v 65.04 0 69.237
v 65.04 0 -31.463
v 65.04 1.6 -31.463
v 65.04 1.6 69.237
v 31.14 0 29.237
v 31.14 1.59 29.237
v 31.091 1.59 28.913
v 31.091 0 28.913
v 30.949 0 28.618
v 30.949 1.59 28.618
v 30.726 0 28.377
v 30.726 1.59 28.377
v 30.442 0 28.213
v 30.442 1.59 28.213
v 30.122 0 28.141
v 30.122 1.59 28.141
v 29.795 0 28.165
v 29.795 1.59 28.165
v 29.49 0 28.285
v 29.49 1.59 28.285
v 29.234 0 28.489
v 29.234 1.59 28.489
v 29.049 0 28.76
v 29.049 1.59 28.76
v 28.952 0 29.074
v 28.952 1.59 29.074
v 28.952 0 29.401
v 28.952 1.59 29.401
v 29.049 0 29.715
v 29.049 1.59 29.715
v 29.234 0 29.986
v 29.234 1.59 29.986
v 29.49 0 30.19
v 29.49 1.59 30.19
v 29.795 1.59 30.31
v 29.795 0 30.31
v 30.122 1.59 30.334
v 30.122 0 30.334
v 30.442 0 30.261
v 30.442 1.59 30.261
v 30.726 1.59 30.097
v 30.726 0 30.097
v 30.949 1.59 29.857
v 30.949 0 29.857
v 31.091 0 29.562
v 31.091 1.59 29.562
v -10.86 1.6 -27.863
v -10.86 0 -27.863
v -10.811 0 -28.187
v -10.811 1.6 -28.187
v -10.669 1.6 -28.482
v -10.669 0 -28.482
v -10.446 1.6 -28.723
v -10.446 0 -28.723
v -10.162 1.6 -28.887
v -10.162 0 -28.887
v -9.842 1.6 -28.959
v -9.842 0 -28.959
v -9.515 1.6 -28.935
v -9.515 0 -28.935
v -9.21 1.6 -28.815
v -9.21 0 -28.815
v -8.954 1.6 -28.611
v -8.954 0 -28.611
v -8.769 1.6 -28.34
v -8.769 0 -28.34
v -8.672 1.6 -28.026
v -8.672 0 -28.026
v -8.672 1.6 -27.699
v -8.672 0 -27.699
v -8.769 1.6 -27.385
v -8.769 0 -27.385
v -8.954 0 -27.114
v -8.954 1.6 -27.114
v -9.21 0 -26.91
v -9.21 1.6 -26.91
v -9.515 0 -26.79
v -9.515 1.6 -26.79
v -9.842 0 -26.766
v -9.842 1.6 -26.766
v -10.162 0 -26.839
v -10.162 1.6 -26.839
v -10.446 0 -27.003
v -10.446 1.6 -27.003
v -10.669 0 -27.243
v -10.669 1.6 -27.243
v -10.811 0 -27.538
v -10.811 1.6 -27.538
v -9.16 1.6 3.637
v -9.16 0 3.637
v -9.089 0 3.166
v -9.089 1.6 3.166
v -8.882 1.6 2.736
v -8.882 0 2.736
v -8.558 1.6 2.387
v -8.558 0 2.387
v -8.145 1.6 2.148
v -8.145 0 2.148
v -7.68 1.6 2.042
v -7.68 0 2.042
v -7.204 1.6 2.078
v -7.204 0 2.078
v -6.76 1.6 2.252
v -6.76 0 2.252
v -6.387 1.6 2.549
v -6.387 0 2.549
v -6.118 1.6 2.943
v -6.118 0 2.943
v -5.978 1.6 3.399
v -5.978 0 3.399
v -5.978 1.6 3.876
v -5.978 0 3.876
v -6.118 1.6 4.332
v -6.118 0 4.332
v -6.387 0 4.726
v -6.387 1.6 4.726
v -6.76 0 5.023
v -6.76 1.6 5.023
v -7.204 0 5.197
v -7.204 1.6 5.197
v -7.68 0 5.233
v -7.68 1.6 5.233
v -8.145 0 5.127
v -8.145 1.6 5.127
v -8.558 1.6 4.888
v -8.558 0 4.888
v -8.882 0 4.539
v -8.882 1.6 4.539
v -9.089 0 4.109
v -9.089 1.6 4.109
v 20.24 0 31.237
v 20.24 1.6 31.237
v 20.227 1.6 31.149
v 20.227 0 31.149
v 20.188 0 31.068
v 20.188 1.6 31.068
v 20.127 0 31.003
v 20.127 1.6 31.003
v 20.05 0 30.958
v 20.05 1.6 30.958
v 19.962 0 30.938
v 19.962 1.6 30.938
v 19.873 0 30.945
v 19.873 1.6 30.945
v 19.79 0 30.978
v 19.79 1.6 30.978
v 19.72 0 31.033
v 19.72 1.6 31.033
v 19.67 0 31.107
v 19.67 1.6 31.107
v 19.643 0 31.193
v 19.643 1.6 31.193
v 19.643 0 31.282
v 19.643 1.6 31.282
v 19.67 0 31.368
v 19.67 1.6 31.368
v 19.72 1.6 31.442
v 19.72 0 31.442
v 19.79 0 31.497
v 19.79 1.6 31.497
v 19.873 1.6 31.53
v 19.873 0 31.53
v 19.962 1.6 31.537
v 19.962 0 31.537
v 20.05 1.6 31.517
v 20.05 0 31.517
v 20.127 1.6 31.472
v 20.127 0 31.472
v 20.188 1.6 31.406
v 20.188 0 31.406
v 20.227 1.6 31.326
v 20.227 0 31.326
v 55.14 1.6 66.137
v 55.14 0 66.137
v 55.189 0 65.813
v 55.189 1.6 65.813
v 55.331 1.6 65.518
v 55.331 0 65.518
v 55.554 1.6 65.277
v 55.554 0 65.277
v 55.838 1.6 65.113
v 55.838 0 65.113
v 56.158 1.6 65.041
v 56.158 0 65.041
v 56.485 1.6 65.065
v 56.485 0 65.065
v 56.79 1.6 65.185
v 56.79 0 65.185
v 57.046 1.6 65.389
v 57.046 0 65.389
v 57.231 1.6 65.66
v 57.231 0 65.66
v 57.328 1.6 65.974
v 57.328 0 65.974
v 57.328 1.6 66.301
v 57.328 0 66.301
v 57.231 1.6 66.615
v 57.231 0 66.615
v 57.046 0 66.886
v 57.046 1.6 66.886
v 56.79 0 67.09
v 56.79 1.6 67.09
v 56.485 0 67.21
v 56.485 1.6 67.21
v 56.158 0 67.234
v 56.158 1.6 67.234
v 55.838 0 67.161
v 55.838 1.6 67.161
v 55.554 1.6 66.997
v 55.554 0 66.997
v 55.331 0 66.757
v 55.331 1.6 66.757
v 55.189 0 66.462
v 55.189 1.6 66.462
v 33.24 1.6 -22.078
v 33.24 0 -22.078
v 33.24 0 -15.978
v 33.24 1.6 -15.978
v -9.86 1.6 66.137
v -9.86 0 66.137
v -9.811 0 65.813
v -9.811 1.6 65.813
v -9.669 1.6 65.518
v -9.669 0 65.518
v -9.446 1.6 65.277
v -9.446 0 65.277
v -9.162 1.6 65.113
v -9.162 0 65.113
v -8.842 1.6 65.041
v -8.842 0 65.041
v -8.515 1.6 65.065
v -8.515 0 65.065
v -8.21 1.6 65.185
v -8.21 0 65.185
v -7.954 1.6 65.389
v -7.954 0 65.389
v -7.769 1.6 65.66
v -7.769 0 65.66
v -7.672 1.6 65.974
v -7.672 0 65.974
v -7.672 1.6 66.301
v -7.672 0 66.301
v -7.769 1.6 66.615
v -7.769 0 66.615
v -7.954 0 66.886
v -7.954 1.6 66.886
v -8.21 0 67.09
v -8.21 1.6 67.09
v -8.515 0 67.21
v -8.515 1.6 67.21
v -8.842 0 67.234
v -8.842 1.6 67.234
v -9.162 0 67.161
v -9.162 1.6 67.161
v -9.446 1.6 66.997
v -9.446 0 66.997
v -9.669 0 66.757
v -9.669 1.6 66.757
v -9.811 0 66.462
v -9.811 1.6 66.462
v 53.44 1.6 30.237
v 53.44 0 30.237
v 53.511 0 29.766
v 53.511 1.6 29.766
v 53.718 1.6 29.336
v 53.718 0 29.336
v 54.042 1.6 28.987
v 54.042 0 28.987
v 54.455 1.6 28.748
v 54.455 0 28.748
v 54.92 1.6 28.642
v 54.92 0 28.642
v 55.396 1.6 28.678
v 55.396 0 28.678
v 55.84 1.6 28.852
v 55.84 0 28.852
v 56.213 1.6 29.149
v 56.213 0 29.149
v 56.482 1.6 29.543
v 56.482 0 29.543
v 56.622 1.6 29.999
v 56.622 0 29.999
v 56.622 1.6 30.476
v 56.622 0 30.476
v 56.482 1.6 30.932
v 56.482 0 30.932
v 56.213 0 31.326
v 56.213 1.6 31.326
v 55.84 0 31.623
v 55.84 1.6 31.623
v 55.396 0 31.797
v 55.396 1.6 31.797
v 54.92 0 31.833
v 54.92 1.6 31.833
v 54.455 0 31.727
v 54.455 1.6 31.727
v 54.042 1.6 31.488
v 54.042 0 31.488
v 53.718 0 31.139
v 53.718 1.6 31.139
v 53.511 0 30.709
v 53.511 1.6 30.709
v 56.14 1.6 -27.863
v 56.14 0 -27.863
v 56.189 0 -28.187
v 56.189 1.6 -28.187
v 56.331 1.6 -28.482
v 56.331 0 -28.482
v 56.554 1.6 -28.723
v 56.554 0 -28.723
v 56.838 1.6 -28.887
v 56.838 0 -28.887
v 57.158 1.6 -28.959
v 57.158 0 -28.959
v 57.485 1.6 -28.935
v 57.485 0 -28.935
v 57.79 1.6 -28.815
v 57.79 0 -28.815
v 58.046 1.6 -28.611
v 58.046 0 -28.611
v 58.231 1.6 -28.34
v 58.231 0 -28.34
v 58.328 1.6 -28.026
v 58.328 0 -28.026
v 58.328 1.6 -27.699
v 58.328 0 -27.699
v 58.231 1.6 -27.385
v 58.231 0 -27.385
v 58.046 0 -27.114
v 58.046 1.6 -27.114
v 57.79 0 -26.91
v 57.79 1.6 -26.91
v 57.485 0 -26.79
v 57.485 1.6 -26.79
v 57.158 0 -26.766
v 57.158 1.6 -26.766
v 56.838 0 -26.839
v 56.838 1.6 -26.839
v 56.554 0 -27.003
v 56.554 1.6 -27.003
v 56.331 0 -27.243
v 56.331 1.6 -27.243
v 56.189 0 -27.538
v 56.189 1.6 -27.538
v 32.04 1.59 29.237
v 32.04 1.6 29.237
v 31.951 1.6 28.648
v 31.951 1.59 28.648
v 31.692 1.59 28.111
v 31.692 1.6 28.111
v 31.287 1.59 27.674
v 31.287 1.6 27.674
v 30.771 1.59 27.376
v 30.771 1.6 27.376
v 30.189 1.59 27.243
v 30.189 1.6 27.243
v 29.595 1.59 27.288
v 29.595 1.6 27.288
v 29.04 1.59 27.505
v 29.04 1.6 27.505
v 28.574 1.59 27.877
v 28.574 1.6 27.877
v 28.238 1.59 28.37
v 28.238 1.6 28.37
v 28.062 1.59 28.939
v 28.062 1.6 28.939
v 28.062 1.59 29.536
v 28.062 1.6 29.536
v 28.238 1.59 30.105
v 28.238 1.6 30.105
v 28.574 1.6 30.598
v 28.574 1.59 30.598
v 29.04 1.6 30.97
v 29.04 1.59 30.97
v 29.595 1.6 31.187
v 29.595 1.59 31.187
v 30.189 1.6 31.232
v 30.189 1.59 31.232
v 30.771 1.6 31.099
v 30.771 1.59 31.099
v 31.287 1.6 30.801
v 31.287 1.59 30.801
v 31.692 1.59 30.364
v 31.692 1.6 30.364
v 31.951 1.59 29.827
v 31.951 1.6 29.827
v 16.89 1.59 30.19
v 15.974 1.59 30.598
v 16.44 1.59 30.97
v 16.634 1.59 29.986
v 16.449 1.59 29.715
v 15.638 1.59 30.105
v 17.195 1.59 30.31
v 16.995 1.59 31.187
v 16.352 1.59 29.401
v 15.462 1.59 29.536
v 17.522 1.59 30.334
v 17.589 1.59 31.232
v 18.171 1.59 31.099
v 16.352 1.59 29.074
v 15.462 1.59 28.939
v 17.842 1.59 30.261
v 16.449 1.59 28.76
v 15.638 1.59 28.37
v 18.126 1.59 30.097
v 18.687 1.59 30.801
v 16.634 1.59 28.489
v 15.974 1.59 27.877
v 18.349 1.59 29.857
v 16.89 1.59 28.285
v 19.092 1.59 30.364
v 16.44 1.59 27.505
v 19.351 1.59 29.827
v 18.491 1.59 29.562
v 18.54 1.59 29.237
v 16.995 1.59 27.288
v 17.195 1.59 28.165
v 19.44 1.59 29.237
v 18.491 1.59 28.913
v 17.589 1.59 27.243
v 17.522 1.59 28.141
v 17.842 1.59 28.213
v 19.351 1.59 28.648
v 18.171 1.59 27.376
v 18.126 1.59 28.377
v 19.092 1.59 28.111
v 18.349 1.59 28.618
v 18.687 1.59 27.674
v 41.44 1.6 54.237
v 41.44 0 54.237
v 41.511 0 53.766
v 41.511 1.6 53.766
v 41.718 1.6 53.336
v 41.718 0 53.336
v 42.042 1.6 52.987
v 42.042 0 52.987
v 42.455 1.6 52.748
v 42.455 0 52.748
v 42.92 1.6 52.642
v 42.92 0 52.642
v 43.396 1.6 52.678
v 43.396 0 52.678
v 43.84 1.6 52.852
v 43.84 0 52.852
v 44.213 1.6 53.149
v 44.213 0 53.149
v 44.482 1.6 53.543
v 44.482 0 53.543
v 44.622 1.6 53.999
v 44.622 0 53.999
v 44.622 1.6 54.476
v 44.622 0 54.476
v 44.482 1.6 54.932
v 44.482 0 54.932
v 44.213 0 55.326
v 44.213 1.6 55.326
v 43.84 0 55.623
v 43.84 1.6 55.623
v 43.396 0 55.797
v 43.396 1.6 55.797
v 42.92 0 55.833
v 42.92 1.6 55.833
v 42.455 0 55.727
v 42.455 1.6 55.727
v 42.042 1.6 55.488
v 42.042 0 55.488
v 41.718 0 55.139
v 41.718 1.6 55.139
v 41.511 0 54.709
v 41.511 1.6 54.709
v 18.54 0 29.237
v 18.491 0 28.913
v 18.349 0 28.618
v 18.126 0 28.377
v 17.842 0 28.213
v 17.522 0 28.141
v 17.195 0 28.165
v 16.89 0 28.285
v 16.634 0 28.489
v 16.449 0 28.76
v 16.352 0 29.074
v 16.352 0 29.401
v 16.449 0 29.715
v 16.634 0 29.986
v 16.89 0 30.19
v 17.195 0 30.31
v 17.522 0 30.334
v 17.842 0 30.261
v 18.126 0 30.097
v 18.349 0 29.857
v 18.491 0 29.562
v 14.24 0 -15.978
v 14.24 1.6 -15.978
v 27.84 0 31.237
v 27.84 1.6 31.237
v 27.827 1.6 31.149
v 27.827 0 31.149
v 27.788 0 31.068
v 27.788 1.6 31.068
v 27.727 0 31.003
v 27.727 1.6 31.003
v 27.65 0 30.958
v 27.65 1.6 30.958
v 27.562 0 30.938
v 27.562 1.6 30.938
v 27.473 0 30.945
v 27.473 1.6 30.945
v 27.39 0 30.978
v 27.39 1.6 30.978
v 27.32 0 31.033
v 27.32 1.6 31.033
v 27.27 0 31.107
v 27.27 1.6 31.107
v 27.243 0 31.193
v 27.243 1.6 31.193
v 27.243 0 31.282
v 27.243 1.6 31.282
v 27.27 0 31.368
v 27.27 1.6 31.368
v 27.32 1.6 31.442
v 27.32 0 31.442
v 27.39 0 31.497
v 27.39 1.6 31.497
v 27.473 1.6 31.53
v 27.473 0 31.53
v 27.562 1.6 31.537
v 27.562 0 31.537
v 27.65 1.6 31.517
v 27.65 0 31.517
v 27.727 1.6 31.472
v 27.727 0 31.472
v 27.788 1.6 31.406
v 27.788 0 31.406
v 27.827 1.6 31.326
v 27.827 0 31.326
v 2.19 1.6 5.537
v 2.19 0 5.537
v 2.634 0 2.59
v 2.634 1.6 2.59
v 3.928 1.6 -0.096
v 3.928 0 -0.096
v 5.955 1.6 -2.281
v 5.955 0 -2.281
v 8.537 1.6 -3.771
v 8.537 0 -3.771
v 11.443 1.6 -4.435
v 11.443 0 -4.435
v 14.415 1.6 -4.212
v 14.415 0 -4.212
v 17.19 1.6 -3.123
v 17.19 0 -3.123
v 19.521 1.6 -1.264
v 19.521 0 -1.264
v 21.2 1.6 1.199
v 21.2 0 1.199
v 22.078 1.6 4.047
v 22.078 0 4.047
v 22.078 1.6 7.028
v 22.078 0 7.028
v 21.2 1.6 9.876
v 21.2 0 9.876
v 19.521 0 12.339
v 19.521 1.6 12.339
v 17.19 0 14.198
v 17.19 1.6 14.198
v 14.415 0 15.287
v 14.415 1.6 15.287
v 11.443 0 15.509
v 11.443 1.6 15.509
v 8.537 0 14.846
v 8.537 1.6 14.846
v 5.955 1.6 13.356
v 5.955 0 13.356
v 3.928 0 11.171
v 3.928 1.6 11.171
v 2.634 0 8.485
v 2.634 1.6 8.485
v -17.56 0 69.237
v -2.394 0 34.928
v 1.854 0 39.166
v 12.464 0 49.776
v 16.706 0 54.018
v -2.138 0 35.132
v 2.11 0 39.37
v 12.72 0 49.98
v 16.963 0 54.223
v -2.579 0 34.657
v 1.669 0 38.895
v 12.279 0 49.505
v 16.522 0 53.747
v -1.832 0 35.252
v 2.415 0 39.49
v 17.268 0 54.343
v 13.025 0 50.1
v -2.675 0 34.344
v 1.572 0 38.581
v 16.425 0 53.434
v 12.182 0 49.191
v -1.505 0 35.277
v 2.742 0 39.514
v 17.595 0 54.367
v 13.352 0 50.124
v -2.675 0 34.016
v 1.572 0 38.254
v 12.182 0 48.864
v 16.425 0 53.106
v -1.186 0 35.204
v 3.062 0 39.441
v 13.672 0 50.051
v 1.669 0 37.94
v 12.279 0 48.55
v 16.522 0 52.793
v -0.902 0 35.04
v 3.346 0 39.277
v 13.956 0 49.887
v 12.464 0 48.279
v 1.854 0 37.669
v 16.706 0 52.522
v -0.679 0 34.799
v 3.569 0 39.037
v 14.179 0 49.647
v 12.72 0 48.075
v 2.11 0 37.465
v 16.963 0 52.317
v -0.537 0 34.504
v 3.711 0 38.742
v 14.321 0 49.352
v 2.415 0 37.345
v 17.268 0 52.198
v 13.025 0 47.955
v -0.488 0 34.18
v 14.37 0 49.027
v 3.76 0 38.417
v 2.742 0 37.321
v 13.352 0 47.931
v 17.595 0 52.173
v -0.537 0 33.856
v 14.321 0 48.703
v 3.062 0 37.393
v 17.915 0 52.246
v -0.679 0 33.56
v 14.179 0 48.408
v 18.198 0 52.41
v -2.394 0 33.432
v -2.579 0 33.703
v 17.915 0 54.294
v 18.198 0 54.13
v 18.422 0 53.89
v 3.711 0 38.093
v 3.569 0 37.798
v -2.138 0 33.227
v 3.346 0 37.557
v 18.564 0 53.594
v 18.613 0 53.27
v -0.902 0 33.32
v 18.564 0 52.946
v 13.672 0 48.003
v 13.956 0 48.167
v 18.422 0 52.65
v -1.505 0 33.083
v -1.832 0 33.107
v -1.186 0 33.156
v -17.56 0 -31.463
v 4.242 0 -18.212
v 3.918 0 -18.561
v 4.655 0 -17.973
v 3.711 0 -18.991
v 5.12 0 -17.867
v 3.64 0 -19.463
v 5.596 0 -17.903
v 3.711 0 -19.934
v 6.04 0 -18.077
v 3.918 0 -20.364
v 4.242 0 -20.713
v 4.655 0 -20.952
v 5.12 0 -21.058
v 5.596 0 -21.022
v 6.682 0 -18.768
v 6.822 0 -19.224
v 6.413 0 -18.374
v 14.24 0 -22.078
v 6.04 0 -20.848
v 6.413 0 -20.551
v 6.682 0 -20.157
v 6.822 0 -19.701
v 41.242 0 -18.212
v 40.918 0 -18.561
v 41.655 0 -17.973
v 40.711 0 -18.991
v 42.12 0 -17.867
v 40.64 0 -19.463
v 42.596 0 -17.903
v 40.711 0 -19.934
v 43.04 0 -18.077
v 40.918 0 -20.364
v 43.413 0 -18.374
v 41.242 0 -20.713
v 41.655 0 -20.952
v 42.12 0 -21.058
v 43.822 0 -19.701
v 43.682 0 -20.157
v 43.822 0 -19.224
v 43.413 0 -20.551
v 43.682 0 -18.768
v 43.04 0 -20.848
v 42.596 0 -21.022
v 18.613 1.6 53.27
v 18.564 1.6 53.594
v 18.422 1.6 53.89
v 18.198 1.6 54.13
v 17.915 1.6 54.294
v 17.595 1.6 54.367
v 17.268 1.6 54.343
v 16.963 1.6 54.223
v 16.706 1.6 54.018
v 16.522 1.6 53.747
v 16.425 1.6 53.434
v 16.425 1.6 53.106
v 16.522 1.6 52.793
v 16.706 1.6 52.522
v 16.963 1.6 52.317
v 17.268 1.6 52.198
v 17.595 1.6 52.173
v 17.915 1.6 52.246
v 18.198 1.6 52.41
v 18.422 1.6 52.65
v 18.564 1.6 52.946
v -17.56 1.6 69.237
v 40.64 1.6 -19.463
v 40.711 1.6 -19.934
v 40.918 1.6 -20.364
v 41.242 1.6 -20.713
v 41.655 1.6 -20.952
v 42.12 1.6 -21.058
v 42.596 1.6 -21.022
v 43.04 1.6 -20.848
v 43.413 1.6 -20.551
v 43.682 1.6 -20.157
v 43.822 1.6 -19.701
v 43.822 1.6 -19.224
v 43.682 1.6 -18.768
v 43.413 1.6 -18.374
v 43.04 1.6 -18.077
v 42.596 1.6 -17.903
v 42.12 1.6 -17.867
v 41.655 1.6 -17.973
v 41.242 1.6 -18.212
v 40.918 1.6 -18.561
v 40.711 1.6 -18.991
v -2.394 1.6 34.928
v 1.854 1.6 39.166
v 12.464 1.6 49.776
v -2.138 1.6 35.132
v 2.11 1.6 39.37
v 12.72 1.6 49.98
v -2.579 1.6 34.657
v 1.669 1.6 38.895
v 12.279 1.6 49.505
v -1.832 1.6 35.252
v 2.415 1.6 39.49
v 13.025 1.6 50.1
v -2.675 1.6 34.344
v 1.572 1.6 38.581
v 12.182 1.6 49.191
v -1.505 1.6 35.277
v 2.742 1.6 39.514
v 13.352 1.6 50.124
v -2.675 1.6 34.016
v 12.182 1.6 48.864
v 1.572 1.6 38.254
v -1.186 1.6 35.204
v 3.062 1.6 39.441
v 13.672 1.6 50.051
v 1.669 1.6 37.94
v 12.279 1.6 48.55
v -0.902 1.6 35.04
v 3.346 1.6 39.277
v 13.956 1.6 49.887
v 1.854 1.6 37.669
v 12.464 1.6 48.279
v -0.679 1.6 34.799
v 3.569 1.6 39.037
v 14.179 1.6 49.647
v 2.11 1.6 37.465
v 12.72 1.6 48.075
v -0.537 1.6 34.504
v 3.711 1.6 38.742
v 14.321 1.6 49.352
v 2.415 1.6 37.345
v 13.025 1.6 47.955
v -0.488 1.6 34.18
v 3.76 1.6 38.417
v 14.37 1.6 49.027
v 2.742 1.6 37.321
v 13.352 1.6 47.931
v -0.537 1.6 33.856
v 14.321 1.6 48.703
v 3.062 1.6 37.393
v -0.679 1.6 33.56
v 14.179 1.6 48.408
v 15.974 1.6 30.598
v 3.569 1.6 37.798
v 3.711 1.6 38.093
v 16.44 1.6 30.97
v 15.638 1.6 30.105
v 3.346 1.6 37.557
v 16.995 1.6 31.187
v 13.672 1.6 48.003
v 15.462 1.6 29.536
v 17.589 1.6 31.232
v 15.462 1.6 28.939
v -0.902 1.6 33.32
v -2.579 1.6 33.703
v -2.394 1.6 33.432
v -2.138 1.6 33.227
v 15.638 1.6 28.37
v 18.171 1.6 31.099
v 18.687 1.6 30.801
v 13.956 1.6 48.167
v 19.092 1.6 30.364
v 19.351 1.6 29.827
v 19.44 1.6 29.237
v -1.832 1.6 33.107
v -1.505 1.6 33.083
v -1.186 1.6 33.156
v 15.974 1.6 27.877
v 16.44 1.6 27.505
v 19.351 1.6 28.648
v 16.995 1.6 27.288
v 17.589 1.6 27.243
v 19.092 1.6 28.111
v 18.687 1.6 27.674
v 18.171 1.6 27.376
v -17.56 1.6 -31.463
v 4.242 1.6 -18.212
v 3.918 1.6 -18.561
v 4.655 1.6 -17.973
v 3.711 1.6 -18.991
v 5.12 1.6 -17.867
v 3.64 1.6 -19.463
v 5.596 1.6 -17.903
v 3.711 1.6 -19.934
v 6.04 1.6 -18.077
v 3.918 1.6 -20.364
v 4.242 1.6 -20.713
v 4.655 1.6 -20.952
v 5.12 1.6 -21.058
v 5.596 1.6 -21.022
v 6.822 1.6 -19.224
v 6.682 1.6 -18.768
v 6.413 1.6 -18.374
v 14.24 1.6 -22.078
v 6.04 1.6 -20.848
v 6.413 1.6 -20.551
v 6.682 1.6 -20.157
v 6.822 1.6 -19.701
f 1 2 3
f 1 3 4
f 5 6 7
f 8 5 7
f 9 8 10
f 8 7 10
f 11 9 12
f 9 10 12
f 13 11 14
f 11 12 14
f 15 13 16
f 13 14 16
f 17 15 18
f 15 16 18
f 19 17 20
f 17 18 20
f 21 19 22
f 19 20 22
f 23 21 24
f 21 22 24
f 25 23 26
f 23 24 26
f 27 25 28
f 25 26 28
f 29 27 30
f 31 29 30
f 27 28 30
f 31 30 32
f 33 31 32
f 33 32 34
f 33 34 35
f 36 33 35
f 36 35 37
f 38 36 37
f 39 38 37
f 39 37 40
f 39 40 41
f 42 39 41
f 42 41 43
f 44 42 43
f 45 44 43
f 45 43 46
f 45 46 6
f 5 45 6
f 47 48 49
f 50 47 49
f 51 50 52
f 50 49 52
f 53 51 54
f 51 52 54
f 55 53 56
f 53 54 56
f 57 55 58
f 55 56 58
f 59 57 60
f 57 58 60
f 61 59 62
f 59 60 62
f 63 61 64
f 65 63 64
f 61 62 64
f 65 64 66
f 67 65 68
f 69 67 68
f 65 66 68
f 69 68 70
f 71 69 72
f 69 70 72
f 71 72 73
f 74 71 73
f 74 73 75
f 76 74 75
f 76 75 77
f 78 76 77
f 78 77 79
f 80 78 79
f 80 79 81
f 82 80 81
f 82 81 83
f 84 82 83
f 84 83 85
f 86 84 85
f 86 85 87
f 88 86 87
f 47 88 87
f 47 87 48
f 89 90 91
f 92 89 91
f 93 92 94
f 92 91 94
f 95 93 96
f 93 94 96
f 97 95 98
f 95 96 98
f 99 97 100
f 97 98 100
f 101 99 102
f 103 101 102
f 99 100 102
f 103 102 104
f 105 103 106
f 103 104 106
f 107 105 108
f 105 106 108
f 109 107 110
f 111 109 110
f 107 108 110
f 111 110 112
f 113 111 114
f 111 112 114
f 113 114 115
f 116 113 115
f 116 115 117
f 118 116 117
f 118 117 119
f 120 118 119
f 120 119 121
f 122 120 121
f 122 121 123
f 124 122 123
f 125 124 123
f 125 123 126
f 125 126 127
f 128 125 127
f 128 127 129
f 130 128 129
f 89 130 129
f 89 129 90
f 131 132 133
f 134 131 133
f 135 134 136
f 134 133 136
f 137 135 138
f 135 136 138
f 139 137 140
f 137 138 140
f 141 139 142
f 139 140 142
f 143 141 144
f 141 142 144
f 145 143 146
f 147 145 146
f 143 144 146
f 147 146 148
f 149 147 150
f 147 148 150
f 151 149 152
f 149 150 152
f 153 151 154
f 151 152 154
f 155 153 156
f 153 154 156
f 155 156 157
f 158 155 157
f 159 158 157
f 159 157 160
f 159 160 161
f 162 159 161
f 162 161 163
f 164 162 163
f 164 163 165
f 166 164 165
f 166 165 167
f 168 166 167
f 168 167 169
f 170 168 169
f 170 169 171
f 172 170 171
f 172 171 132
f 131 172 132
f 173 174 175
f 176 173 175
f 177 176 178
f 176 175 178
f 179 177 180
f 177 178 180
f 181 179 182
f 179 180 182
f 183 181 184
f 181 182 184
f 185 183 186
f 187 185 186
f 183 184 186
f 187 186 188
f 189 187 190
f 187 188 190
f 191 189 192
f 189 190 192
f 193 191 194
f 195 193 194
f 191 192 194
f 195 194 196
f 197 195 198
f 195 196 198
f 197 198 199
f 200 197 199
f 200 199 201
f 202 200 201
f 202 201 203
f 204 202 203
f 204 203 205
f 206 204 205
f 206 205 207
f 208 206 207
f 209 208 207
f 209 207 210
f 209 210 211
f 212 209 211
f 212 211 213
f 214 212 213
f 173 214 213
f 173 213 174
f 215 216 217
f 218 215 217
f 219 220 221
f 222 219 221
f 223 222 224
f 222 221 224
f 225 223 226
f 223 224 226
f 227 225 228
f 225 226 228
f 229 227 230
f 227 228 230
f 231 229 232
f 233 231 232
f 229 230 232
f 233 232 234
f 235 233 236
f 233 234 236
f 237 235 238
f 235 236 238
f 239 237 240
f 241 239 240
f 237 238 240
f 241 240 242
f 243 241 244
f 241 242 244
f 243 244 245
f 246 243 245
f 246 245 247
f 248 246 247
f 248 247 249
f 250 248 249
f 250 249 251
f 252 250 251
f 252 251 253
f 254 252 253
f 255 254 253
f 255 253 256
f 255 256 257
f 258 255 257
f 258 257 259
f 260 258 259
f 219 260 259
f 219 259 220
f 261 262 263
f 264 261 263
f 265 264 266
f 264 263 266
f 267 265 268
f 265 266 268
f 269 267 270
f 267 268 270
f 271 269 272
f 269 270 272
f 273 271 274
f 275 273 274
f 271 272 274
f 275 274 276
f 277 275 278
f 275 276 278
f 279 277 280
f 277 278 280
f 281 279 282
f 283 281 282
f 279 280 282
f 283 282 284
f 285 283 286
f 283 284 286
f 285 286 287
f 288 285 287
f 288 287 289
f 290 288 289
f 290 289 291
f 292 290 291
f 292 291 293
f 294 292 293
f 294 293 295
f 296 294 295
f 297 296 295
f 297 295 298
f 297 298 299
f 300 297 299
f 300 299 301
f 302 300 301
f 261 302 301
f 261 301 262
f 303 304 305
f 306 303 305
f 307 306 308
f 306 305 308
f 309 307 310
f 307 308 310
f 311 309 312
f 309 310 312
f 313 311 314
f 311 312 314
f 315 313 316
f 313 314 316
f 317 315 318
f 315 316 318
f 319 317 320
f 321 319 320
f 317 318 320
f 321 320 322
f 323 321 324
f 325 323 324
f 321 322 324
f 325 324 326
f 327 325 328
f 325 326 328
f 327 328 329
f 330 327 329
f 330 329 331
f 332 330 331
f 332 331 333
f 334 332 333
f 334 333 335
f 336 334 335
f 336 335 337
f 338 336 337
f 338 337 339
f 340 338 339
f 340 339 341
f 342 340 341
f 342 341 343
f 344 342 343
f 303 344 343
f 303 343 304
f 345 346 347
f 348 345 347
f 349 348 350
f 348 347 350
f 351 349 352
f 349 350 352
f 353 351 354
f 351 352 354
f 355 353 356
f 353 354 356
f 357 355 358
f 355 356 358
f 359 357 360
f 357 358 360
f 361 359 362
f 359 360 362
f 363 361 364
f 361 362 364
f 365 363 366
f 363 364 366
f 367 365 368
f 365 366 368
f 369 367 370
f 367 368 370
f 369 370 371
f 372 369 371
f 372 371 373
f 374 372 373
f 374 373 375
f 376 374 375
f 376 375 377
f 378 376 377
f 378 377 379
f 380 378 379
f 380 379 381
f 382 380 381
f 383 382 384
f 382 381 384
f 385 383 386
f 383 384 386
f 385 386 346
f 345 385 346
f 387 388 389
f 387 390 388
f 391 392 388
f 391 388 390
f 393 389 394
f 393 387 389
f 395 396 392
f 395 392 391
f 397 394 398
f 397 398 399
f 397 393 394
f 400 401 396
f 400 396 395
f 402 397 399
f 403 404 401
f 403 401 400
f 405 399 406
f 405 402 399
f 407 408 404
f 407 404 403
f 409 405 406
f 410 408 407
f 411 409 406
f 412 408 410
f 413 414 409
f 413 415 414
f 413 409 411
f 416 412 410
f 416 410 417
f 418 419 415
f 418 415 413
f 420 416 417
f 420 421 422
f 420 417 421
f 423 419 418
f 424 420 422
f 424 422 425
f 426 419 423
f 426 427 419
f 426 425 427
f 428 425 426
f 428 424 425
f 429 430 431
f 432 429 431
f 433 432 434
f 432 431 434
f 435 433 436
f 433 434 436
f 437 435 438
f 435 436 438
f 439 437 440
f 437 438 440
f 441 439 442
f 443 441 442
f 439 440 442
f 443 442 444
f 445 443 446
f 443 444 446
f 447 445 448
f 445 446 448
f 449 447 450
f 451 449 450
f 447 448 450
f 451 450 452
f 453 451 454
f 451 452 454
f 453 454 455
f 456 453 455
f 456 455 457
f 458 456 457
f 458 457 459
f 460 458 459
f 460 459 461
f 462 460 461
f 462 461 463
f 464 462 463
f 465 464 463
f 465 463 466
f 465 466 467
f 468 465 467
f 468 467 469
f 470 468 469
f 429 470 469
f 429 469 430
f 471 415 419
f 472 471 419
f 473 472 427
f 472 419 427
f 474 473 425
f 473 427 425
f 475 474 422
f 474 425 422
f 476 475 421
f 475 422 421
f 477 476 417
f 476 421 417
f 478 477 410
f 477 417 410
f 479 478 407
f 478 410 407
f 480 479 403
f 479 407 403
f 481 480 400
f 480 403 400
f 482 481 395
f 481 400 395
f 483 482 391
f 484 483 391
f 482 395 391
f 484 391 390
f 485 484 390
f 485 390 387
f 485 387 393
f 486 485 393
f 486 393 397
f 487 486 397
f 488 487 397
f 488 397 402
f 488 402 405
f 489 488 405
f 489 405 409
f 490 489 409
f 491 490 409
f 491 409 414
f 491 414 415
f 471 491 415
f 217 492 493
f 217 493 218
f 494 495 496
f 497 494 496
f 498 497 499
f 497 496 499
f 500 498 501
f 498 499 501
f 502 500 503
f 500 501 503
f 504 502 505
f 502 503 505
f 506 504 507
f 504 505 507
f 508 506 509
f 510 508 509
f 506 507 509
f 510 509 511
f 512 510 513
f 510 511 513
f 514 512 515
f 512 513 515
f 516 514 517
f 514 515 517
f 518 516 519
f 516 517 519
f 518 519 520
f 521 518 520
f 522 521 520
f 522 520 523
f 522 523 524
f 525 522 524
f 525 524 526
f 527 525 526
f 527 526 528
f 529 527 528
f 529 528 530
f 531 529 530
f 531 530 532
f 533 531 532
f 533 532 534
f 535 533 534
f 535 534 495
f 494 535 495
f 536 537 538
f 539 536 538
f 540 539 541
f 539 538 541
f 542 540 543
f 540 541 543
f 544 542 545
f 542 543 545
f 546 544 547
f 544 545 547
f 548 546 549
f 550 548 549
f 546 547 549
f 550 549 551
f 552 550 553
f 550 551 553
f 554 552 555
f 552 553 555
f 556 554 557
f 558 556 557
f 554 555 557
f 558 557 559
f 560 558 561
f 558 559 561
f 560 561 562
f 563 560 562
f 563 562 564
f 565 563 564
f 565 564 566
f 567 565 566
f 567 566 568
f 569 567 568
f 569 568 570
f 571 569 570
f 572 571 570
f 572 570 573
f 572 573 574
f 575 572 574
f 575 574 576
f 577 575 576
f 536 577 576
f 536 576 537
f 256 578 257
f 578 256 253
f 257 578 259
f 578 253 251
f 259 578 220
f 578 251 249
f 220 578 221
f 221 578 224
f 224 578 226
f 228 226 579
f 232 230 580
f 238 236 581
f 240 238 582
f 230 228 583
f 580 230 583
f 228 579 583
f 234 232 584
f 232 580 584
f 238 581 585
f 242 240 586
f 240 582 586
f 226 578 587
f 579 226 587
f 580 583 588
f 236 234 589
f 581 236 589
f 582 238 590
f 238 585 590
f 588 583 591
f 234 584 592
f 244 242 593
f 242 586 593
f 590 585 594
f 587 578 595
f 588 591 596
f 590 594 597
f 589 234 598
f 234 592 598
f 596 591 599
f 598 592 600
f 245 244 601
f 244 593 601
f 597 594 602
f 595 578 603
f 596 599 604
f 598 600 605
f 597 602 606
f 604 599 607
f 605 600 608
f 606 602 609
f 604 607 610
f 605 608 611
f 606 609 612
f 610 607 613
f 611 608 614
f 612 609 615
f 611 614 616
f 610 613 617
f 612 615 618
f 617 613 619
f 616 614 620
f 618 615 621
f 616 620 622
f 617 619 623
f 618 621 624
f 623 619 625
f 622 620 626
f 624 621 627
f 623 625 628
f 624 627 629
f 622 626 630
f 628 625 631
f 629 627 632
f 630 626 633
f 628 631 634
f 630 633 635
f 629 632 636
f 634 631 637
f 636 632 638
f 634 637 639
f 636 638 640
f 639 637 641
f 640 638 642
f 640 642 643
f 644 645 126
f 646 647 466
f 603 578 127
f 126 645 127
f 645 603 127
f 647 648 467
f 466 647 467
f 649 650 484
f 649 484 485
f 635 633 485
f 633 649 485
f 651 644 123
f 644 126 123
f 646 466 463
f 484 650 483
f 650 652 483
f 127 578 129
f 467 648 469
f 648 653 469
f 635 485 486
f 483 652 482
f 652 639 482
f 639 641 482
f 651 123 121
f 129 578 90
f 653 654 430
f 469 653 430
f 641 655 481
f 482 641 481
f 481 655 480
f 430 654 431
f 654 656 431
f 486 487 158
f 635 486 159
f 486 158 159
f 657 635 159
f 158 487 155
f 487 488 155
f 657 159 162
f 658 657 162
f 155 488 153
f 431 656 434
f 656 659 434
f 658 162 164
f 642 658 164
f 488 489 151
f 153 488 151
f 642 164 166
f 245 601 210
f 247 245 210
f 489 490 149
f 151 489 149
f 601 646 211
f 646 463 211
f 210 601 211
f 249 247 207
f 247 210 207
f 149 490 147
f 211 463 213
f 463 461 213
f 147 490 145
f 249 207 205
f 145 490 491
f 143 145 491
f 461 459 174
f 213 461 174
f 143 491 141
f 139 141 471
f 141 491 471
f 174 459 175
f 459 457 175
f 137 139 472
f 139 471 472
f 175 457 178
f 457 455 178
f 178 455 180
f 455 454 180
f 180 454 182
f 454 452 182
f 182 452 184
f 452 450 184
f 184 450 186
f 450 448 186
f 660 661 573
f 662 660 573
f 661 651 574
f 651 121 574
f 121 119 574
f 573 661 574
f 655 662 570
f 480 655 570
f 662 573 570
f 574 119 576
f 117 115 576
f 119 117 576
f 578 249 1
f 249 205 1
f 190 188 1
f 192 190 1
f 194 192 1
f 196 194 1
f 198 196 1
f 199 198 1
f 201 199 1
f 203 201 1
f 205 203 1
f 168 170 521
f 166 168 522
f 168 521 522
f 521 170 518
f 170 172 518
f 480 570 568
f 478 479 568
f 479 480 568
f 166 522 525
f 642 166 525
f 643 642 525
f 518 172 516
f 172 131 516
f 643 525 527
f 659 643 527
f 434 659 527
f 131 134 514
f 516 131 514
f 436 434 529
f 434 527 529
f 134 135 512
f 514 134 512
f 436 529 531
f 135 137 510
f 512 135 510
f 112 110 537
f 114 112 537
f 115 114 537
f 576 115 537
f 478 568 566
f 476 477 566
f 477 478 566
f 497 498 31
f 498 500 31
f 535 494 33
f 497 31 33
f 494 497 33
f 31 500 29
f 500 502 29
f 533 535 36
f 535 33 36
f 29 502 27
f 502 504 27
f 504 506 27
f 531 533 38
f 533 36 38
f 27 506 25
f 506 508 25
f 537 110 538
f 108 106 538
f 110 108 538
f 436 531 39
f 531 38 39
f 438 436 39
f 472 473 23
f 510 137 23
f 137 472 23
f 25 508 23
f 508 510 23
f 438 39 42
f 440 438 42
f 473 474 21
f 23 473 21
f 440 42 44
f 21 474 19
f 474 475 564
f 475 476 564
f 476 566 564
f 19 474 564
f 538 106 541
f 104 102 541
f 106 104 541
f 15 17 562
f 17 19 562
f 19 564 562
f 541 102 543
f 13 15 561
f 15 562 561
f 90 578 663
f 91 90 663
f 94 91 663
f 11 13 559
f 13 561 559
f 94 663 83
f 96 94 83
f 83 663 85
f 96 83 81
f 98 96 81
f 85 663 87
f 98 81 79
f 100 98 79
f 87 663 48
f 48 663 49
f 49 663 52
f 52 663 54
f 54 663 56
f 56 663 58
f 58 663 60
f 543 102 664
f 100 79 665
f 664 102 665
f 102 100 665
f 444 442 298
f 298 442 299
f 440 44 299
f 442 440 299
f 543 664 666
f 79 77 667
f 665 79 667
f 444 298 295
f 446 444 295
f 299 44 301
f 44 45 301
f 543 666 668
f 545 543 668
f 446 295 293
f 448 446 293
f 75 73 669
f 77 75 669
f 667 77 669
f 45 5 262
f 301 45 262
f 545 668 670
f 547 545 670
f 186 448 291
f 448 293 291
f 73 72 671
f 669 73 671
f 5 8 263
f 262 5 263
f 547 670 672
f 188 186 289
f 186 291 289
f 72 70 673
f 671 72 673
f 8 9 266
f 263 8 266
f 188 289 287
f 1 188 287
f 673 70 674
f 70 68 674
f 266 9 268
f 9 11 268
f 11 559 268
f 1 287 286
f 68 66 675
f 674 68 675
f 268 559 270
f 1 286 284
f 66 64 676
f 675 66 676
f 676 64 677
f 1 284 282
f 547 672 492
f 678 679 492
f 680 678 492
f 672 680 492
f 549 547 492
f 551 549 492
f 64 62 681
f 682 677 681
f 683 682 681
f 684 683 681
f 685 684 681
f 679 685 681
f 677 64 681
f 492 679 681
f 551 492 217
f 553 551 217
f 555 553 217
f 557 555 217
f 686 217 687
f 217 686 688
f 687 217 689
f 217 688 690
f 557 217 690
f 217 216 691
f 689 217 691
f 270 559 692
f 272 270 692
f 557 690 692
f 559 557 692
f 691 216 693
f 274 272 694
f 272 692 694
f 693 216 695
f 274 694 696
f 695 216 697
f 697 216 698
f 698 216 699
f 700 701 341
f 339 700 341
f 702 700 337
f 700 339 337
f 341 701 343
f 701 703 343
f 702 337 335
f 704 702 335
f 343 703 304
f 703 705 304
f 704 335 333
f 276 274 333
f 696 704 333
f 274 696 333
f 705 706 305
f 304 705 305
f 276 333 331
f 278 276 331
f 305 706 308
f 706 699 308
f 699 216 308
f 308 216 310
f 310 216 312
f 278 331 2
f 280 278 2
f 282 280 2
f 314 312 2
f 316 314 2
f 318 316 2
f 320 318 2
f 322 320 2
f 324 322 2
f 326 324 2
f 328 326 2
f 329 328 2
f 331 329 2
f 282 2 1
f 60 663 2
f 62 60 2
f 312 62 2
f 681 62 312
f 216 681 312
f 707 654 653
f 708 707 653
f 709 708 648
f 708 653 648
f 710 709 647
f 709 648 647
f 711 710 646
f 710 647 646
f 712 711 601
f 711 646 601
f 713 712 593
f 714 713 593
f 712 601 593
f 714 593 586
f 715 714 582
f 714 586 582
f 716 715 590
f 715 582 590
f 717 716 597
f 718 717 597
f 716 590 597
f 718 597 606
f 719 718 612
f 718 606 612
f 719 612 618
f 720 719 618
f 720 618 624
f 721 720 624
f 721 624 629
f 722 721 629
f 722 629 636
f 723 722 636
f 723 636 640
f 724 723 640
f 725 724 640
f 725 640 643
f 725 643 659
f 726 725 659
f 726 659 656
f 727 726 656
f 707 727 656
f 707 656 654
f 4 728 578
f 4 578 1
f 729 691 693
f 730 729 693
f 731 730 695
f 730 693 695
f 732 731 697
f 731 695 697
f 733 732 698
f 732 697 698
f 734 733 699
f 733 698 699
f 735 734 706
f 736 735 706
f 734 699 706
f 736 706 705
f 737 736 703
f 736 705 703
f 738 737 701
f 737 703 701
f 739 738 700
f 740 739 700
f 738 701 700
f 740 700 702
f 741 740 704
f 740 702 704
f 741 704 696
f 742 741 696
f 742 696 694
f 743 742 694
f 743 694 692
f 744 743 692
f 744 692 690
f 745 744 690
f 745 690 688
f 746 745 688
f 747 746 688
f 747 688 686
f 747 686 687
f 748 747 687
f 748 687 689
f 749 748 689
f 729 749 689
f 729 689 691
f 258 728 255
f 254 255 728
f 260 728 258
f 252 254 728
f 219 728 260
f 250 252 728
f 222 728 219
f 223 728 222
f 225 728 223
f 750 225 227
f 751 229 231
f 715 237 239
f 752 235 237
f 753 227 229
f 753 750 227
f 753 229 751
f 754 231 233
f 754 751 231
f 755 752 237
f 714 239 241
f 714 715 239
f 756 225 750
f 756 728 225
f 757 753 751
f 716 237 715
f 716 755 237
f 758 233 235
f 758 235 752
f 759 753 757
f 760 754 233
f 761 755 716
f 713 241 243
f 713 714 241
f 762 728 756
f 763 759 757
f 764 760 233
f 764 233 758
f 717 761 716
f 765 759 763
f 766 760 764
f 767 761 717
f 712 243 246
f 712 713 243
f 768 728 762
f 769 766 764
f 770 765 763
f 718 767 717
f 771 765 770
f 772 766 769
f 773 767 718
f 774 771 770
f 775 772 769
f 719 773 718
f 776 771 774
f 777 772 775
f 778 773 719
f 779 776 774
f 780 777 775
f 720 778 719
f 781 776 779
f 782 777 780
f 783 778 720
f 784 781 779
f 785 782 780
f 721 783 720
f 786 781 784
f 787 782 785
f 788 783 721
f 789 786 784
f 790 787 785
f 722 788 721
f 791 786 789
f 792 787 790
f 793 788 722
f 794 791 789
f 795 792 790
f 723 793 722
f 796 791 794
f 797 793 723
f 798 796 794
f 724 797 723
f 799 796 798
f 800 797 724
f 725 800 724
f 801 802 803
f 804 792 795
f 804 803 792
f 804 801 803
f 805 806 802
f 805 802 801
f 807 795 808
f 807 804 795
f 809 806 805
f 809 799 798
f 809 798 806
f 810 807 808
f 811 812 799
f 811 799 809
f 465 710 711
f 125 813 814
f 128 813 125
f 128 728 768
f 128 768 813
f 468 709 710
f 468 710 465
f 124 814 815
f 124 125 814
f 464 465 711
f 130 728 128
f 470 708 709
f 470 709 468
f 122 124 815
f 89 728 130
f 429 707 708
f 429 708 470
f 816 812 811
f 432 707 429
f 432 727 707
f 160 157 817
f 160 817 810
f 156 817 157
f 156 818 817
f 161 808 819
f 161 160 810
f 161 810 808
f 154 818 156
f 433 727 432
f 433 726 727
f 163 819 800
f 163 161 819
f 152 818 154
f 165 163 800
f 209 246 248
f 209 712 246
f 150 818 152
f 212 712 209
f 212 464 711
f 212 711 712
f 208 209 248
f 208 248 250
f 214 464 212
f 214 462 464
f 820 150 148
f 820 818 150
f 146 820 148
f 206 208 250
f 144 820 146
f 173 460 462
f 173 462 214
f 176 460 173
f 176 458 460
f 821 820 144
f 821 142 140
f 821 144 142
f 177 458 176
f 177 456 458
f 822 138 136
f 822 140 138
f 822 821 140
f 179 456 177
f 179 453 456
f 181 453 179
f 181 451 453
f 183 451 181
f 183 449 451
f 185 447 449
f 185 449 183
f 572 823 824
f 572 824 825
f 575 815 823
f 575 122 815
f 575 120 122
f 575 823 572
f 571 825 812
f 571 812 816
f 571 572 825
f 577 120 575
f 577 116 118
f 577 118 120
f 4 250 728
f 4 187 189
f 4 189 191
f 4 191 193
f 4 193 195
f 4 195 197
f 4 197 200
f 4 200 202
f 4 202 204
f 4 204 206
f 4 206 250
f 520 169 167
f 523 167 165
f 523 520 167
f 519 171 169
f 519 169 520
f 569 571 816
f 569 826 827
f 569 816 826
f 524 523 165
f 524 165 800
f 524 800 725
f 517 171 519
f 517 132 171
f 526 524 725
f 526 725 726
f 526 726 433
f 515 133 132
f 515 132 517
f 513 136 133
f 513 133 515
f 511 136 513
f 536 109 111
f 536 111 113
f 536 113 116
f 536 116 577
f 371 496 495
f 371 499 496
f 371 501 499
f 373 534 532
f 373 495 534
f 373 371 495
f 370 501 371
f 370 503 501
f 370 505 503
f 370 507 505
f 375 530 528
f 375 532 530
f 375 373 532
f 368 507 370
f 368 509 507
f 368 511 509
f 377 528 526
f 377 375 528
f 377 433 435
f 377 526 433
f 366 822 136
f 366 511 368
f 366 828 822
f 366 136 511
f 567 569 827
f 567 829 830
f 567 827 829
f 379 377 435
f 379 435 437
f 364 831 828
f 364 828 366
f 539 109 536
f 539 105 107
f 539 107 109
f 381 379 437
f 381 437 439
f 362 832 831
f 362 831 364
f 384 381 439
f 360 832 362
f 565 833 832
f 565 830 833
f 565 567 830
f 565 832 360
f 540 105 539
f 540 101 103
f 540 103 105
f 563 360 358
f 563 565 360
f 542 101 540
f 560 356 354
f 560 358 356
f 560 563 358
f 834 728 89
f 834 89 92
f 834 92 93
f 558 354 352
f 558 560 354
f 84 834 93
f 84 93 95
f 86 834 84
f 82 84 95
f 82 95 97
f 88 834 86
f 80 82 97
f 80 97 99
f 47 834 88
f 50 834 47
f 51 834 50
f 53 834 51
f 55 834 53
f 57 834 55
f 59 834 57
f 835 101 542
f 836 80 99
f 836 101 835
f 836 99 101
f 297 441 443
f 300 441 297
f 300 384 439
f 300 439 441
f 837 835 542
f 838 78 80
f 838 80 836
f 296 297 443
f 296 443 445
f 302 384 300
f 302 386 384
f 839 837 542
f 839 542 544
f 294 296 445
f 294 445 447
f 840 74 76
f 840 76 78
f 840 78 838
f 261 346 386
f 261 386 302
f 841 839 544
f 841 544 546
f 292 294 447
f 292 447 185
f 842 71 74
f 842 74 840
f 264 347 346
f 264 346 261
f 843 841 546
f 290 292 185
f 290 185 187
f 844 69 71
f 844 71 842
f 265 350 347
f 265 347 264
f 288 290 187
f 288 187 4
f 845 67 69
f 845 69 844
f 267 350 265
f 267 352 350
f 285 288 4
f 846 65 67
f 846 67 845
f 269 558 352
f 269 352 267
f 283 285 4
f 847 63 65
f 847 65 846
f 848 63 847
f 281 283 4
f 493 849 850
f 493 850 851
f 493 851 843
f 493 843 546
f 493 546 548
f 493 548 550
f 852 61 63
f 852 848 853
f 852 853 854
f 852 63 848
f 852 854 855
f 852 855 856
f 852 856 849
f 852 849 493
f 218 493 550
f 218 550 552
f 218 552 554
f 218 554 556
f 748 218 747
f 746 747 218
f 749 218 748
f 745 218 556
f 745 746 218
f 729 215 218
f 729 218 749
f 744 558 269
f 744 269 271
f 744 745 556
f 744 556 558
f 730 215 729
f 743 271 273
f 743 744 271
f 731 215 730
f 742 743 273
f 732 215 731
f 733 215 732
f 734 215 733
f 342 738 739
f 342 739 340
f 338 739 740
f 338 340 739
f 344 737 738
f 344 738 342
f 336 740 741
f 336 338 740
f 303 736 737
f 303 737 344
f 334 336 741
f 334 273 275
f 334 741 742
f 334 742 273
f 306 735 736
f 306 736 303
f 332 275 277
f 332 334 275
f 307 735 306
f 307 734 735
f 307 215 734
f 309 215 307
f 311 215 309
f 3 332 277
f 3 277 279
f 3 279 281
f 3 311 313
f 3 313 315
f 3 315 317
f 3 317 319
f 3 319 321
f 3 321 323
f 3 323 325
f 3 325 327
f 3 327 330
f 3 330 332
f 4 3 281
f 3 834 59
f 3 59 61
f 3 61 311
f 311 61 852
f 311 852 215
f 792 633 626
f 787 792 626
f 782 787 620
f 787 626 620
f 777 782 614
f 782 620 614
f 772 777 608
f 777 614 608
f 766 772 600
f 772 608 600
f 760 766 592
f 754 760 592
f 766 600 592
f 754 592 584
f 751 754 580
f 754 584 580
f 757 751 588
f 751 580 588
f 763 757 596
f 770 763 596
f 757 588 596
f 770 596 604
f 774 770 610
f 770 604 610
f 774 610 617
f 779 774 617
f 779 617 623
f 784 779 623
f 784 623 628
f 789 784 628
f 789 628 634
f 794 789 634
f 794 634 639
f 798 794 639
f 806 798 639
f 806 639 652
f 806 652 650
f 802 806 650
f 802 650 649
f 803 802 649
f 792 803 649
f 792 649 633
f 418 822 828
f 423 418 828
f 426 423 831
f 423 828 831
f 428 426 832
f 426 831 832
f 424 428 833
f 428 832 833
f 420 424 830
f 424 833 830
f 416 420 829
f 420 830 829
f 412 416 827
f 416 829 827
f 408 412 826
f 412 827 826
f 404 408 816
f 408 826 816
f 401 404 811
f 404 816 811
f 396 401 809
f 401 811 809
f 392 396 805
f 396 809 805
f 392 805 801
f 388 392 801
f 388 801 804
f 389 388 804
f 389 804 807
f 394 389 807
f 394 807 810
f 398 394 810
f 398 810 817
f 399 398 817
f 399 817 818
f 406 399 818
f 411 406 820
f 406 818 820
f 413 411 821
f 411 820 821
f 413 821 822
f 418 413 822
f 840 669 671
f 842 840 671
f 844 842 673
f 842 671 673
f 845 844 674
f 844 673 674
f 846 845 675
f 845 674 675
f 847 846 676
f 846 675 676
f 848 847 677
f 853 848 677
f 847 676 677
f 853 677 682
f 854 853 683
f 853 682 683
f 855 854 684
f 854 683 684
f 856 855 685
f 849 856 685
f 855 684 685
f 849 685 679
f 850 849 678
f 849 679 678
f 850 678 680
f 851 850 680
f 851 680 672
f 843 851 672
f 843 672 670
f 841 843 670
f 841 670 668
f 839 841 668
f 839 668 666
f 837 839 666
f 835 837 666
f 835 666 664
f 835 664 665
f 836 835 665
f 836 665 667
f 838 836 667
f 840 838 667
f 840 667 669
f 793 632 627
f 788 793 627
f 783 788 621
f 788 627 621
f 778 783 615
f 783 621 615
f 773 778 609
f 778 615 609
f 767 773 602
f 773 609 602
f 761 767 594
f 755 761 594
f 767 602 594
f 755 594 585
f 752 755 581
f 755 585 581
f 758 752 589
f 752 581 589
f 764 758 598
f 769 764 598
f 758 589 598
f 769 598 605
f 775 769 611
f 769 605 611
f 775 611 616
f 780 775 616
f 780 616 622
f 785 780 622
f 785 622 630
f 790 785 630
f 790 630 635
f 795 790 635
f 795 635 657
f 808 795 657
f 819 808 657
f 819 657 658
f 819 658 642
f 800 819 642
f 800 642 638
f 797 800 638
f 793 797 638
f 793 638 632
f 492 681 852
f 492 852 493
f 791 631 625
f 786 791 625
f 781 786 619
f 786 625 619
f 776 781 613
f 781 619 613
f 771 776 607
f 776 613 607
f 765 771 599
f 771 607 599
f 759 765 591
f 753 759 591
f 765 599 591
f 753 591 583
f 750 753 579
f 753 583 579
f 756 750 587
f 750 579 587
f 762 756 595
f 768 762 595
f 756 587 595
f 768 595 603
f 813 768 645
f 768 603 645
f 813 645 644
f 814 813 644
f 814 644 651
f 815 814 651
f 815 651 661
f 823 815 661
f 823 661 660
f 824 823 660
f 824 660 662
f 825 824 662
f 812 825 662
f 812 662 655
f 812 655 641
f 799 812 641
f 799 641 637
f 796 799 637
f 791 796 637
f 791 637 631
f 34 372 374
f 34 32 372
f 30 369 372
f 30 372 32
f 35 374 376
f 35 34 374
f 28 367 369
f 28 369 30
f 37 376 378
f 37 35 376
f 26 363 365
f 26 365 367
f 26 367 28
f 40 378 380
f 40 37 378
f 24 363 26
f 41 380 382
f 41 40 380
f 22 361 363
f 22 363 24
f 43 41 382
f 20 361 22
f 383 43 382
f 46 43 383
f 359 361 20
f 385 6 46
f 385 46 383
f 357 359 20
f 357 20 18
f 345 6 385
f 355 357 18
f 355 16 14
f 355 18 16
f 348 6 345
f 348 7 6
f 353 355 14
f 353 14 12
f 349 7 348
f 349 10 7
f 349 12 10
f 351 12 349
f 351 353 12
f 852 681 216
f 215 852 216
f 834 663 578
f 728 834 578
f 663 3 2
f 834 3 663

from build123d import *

# Parameters (mm, degrees)
BOSS_EXTRUDE1_DEPTH            = 1.6
F_2_2_2_2_DIAMETER_HOLE1_D     = 2.2
F_2_2_2_2_DIAMETER_HOLE1_DEPTH = 5
SKETCH9_R                      = 10
CUT_EXTRUDE4_DEPTH             = 2.6
SKETCH15_W                     = 83
SKETCH15_H                     = 2.5
CUT_EXTRUDE8_DEPTH             = 2.6
SKETCH37_W                     = 83
SKETCH37_H                     = 1.6
EXTRUDE1_DEPTH                 = 1.6
SKETCH38_W                     = 83
SKETCH38_H                     = 1.6
EXTRUDE2_DEPTH                 = 1.6
F_2_2_2_2_DIAMETER_HOLE4_D     = 2.2
F_2_2_2_2_DIAMETER_HOLE4_DEPTH = 1.6
SKETCH49_W                     = 0.2
SKETCH49_H                     = 100.7
EXTRUDE5_DEPTH                 = 2.6
SKETCH52_W                     = 19
SKETCH52_H                     = 6.1
CUT_EXTRUDE10_DEPTH            = 2.6
SKETCH_2_R                     = 1.6
CUT_EXTRUDE_2_DEPTH            = 10
SKETCH_8_R                     = 0.3
CUT_EXTRUDE_3_DEPTH            = 10
SKETCH_9_R                     = 1.1
CUT_EXTRUDE_4_DEPTH            = 10
SKETCH_10_R                    = 2
CUT_EXTRUDE_5_DEPTH            = 0.01
SKETCH_11_R                    = 1.1
CUT_EXTRUDE_6_DEPTH            = 10


with BuildPart() as part:
    # Sketch1 → Boss-Extrude1 (new body)
    with BuildSketch(Plane(origin=(0, 0, 0), x_dir=(1, 0, 0), z_dir=(0, 1, 0))):
        Polygon((65.24, 0.272495156), (65.24, -46.437452638), (65.24, -63.637452638), (65.24, -70.137452638), (-17.76, -70.137452638), (-17.76, -63.637452638), (-17.76, -48.637452638), (-17.76, -45.78978272), (-17.76, 4.362547362), (-17.76, 21.562547362), (-17.76, 29.862547362), (65.24, 29.862547362), (65.24, 21.562547362), (65.24, 6.562547362), align=None)
    extrude(amount=BOSS_EXTRUDE1_DEPTH)

    # Ø2.2 (2.2) Diameter Hole1
    with Locations(Plane(origin=(0, 1.6, 0), x_dir=(1, 0, 0), z_dir=(0, 1, 0))):
        with Locations((57.24, 27.862547362), (-9.76, 27.862547362)):
            Hole(F_2_2_2_2_DIAMETER_HOLE1_D / 2, depth=F_2_2_2_2_DIAMETER_HOLE1_DEPTH)

    # Sketch9 → Cut-Extrude4 (cut, through all)
    with BuildSketch(Plane(origin=(0, 0, 0), x_dir=(-1, 0, 0), z_dir=(0, -1, 0))):
        with Locations((-12.19, -5.537452638)):
            Circle(SKETCH9_R)
    extrude(amount=-CUT_EXTRUDE4_DEPTH, mode=Mode.SUBTRACT)

    # Sketch15 → Cut-Extrude8 (cut, through all)
    with BuildSketch(Plane.XZ):
        with Locations((23.74, 68.887452638)):
            Rectangle(SKETCH15_W, SKETCH15_H)
    extrude(amount=-CUT_EXTRUDE8_DEPTH, mode=Mode.SUBTRACT)

    # Sketch37 → Extrude1 (add)
    with BuildSketch(Plane(origin=(0, 0, -29.862547362), x_dir=(-1, 0, 0), z_dir=(0, 0, -1))):
        with Locations((-23.74, 0.8)):
            Rectangle(SKETCH37_W, SKETCH37_H)
    extrude(amount=EXTRUDE1_DEPTH)

    # Sketch38 → Extrude2 (add)
    with BuildSketch(Plane.XY.offset(67.637452638)):
        with Locations((23.74, 0.8)):
            Rectangle(SKETCH38_W, SKETCH38_H)
    extrude(amount=EXTRUDE2_DEPTH)

    # Ø2.2 (2.2) Diameter Hole4
    with Locations(Plane(origin=(0, 1.6, 0), x_dir=(1, 0, 0), z_dir=(0, 1, 0))):
        with Locations((-8.76, -66.137452638), (56.24, -66.137452638)):
            Hole(F_2_2_2_2_DIAMETER_HOLE4_D / 2, depth=F_2_2_2_2_DIAMETER_HOLE4_DEPTH)

    # Sketch49 → Extrude5 (cut, through all)
    with BuildSketch(Plane.XZ):
        with Locations((65.14, 18.887452638)):
            Rectangle(SKETCH49_W, SKETCH49_H)
        with Locations((-17.66, 18.887452638)):
            Rectangle(SKETCH49_W, SKETCH49_H)
    extrude(amount=-EXTRUDE5_DEPTH, mode=Mode.SUBTRACT)

    # Sketch52 → Cut-Extrude10 (cut, through all)
    with BuildSketch(Plane.XZ):
        with Locations((23.74, -19.027547362)):
            Rectangle(SKETCH52_W, SKETCH52_H)
    extrude(amount=-CUT_EXTRUDE10_DEPTH, mode=Mode.SUBTRACT)

    # ｽｹｯﾁ2 → ｶｯﾄ - 押し出し2 (cut)
    with BuildSketch(Plane(origin=(0, 0, 0), x_dir=(-1, 0, 0), z_dir=(0, -1, 0))):
        with Locations((-55.04, -30.237452638)):
            Circle(SKETCH_2_R)
        with Locations((7.56, -3.637452638)):
            Circle(SKETCH_2_R)
        with Locations((-42.24, 19.462547362)):
            Circle(SKETCH_2_R)
        with Locations((-5.24, 19.462547362)):
            Circle(SKETCH_2_R)
        with Locations((-43.04, -54.237452638)):
            Circle(SKETCH_2_R)
    extrude(amount=-CUT_EXTRUDE_2_DEPTH, mode=Mode.SUBTRACT)

    # ｽｹｯﾁ8 → ｶｯﾄ - 押し出し3 (cut)
    with BuildSketch(Plane(origin=(0, 1.6, 0), x_dir=(1, 0, 0), z_dir=(0, 1, 0))):
        with Locations((27.54, -31.237452638)):
            Circle(SKETCH_8_R)
        with Locations((19.94, -31.237452638)):
            Circle(SKETCH_8_R)
    extrude(amount=-CUT_EXTRUDE_3_DEPTH, mode=Mode.SUBTRACT)

    # ｽｹｯﾁ9 → ｶｯﾄ - 押し出し4 (cut)
    with BuildSketch(Plane(origin=(0, 1.6, 0), x_dir=(1, 0, 0), z_dir=(0, 1, 0))):
        with Locations((30.04, -29.237452638)):
            Circle(SKETCH_9_R)
        with Locations((17.44, -29.237452638)):
            Circle(SKETCH_9_R)
    extrude(amount=-CUT_EXTRUDE_4_DEPTH, mode=Mode.SUBTRACT)

    # ｽｹｯﾁ10 → ｶｯﾄ - 押し出し5 (cut)
    with BuildSketch(Plane(origin=(0, 1.6, 0), x_dir=(1, 0, 0), z_dir=(0, 1, 0))):
        with Locations((30.04, -29.237452638)):
            Circle(SKETCH_10_R)
        with Locations((17.44, -29.237452638)):
            Circle(SKETCH_10_R)
    extrude(amount=-CUT_EXTRUDE_5_DEPTH, mode=Mode.SUBTRACT)

    # ｽｹｯﾁ11 → ｶｯﾄ - 押し出し6 (cut)
    with BuildSketch(Plane.XZ):
        with Locations((17.512640687, 53.270093325)):
            Circle(SKETCH_11_R)
        with Locations((13.27, 49.027452638)):
            Circle(SKETCH_11_R)
        with Locations((2.66, 38.417452638)):
            Circle(SKETCH_11_R)
        with Locations((-1.587634962, 34.179812111)):
            Circle(SKETCH_11_R)
    extrude(amount=-CUT_EXTRUDE_6_DEPTH, mode=Mode.SUBTRACT)


solid = part.part
